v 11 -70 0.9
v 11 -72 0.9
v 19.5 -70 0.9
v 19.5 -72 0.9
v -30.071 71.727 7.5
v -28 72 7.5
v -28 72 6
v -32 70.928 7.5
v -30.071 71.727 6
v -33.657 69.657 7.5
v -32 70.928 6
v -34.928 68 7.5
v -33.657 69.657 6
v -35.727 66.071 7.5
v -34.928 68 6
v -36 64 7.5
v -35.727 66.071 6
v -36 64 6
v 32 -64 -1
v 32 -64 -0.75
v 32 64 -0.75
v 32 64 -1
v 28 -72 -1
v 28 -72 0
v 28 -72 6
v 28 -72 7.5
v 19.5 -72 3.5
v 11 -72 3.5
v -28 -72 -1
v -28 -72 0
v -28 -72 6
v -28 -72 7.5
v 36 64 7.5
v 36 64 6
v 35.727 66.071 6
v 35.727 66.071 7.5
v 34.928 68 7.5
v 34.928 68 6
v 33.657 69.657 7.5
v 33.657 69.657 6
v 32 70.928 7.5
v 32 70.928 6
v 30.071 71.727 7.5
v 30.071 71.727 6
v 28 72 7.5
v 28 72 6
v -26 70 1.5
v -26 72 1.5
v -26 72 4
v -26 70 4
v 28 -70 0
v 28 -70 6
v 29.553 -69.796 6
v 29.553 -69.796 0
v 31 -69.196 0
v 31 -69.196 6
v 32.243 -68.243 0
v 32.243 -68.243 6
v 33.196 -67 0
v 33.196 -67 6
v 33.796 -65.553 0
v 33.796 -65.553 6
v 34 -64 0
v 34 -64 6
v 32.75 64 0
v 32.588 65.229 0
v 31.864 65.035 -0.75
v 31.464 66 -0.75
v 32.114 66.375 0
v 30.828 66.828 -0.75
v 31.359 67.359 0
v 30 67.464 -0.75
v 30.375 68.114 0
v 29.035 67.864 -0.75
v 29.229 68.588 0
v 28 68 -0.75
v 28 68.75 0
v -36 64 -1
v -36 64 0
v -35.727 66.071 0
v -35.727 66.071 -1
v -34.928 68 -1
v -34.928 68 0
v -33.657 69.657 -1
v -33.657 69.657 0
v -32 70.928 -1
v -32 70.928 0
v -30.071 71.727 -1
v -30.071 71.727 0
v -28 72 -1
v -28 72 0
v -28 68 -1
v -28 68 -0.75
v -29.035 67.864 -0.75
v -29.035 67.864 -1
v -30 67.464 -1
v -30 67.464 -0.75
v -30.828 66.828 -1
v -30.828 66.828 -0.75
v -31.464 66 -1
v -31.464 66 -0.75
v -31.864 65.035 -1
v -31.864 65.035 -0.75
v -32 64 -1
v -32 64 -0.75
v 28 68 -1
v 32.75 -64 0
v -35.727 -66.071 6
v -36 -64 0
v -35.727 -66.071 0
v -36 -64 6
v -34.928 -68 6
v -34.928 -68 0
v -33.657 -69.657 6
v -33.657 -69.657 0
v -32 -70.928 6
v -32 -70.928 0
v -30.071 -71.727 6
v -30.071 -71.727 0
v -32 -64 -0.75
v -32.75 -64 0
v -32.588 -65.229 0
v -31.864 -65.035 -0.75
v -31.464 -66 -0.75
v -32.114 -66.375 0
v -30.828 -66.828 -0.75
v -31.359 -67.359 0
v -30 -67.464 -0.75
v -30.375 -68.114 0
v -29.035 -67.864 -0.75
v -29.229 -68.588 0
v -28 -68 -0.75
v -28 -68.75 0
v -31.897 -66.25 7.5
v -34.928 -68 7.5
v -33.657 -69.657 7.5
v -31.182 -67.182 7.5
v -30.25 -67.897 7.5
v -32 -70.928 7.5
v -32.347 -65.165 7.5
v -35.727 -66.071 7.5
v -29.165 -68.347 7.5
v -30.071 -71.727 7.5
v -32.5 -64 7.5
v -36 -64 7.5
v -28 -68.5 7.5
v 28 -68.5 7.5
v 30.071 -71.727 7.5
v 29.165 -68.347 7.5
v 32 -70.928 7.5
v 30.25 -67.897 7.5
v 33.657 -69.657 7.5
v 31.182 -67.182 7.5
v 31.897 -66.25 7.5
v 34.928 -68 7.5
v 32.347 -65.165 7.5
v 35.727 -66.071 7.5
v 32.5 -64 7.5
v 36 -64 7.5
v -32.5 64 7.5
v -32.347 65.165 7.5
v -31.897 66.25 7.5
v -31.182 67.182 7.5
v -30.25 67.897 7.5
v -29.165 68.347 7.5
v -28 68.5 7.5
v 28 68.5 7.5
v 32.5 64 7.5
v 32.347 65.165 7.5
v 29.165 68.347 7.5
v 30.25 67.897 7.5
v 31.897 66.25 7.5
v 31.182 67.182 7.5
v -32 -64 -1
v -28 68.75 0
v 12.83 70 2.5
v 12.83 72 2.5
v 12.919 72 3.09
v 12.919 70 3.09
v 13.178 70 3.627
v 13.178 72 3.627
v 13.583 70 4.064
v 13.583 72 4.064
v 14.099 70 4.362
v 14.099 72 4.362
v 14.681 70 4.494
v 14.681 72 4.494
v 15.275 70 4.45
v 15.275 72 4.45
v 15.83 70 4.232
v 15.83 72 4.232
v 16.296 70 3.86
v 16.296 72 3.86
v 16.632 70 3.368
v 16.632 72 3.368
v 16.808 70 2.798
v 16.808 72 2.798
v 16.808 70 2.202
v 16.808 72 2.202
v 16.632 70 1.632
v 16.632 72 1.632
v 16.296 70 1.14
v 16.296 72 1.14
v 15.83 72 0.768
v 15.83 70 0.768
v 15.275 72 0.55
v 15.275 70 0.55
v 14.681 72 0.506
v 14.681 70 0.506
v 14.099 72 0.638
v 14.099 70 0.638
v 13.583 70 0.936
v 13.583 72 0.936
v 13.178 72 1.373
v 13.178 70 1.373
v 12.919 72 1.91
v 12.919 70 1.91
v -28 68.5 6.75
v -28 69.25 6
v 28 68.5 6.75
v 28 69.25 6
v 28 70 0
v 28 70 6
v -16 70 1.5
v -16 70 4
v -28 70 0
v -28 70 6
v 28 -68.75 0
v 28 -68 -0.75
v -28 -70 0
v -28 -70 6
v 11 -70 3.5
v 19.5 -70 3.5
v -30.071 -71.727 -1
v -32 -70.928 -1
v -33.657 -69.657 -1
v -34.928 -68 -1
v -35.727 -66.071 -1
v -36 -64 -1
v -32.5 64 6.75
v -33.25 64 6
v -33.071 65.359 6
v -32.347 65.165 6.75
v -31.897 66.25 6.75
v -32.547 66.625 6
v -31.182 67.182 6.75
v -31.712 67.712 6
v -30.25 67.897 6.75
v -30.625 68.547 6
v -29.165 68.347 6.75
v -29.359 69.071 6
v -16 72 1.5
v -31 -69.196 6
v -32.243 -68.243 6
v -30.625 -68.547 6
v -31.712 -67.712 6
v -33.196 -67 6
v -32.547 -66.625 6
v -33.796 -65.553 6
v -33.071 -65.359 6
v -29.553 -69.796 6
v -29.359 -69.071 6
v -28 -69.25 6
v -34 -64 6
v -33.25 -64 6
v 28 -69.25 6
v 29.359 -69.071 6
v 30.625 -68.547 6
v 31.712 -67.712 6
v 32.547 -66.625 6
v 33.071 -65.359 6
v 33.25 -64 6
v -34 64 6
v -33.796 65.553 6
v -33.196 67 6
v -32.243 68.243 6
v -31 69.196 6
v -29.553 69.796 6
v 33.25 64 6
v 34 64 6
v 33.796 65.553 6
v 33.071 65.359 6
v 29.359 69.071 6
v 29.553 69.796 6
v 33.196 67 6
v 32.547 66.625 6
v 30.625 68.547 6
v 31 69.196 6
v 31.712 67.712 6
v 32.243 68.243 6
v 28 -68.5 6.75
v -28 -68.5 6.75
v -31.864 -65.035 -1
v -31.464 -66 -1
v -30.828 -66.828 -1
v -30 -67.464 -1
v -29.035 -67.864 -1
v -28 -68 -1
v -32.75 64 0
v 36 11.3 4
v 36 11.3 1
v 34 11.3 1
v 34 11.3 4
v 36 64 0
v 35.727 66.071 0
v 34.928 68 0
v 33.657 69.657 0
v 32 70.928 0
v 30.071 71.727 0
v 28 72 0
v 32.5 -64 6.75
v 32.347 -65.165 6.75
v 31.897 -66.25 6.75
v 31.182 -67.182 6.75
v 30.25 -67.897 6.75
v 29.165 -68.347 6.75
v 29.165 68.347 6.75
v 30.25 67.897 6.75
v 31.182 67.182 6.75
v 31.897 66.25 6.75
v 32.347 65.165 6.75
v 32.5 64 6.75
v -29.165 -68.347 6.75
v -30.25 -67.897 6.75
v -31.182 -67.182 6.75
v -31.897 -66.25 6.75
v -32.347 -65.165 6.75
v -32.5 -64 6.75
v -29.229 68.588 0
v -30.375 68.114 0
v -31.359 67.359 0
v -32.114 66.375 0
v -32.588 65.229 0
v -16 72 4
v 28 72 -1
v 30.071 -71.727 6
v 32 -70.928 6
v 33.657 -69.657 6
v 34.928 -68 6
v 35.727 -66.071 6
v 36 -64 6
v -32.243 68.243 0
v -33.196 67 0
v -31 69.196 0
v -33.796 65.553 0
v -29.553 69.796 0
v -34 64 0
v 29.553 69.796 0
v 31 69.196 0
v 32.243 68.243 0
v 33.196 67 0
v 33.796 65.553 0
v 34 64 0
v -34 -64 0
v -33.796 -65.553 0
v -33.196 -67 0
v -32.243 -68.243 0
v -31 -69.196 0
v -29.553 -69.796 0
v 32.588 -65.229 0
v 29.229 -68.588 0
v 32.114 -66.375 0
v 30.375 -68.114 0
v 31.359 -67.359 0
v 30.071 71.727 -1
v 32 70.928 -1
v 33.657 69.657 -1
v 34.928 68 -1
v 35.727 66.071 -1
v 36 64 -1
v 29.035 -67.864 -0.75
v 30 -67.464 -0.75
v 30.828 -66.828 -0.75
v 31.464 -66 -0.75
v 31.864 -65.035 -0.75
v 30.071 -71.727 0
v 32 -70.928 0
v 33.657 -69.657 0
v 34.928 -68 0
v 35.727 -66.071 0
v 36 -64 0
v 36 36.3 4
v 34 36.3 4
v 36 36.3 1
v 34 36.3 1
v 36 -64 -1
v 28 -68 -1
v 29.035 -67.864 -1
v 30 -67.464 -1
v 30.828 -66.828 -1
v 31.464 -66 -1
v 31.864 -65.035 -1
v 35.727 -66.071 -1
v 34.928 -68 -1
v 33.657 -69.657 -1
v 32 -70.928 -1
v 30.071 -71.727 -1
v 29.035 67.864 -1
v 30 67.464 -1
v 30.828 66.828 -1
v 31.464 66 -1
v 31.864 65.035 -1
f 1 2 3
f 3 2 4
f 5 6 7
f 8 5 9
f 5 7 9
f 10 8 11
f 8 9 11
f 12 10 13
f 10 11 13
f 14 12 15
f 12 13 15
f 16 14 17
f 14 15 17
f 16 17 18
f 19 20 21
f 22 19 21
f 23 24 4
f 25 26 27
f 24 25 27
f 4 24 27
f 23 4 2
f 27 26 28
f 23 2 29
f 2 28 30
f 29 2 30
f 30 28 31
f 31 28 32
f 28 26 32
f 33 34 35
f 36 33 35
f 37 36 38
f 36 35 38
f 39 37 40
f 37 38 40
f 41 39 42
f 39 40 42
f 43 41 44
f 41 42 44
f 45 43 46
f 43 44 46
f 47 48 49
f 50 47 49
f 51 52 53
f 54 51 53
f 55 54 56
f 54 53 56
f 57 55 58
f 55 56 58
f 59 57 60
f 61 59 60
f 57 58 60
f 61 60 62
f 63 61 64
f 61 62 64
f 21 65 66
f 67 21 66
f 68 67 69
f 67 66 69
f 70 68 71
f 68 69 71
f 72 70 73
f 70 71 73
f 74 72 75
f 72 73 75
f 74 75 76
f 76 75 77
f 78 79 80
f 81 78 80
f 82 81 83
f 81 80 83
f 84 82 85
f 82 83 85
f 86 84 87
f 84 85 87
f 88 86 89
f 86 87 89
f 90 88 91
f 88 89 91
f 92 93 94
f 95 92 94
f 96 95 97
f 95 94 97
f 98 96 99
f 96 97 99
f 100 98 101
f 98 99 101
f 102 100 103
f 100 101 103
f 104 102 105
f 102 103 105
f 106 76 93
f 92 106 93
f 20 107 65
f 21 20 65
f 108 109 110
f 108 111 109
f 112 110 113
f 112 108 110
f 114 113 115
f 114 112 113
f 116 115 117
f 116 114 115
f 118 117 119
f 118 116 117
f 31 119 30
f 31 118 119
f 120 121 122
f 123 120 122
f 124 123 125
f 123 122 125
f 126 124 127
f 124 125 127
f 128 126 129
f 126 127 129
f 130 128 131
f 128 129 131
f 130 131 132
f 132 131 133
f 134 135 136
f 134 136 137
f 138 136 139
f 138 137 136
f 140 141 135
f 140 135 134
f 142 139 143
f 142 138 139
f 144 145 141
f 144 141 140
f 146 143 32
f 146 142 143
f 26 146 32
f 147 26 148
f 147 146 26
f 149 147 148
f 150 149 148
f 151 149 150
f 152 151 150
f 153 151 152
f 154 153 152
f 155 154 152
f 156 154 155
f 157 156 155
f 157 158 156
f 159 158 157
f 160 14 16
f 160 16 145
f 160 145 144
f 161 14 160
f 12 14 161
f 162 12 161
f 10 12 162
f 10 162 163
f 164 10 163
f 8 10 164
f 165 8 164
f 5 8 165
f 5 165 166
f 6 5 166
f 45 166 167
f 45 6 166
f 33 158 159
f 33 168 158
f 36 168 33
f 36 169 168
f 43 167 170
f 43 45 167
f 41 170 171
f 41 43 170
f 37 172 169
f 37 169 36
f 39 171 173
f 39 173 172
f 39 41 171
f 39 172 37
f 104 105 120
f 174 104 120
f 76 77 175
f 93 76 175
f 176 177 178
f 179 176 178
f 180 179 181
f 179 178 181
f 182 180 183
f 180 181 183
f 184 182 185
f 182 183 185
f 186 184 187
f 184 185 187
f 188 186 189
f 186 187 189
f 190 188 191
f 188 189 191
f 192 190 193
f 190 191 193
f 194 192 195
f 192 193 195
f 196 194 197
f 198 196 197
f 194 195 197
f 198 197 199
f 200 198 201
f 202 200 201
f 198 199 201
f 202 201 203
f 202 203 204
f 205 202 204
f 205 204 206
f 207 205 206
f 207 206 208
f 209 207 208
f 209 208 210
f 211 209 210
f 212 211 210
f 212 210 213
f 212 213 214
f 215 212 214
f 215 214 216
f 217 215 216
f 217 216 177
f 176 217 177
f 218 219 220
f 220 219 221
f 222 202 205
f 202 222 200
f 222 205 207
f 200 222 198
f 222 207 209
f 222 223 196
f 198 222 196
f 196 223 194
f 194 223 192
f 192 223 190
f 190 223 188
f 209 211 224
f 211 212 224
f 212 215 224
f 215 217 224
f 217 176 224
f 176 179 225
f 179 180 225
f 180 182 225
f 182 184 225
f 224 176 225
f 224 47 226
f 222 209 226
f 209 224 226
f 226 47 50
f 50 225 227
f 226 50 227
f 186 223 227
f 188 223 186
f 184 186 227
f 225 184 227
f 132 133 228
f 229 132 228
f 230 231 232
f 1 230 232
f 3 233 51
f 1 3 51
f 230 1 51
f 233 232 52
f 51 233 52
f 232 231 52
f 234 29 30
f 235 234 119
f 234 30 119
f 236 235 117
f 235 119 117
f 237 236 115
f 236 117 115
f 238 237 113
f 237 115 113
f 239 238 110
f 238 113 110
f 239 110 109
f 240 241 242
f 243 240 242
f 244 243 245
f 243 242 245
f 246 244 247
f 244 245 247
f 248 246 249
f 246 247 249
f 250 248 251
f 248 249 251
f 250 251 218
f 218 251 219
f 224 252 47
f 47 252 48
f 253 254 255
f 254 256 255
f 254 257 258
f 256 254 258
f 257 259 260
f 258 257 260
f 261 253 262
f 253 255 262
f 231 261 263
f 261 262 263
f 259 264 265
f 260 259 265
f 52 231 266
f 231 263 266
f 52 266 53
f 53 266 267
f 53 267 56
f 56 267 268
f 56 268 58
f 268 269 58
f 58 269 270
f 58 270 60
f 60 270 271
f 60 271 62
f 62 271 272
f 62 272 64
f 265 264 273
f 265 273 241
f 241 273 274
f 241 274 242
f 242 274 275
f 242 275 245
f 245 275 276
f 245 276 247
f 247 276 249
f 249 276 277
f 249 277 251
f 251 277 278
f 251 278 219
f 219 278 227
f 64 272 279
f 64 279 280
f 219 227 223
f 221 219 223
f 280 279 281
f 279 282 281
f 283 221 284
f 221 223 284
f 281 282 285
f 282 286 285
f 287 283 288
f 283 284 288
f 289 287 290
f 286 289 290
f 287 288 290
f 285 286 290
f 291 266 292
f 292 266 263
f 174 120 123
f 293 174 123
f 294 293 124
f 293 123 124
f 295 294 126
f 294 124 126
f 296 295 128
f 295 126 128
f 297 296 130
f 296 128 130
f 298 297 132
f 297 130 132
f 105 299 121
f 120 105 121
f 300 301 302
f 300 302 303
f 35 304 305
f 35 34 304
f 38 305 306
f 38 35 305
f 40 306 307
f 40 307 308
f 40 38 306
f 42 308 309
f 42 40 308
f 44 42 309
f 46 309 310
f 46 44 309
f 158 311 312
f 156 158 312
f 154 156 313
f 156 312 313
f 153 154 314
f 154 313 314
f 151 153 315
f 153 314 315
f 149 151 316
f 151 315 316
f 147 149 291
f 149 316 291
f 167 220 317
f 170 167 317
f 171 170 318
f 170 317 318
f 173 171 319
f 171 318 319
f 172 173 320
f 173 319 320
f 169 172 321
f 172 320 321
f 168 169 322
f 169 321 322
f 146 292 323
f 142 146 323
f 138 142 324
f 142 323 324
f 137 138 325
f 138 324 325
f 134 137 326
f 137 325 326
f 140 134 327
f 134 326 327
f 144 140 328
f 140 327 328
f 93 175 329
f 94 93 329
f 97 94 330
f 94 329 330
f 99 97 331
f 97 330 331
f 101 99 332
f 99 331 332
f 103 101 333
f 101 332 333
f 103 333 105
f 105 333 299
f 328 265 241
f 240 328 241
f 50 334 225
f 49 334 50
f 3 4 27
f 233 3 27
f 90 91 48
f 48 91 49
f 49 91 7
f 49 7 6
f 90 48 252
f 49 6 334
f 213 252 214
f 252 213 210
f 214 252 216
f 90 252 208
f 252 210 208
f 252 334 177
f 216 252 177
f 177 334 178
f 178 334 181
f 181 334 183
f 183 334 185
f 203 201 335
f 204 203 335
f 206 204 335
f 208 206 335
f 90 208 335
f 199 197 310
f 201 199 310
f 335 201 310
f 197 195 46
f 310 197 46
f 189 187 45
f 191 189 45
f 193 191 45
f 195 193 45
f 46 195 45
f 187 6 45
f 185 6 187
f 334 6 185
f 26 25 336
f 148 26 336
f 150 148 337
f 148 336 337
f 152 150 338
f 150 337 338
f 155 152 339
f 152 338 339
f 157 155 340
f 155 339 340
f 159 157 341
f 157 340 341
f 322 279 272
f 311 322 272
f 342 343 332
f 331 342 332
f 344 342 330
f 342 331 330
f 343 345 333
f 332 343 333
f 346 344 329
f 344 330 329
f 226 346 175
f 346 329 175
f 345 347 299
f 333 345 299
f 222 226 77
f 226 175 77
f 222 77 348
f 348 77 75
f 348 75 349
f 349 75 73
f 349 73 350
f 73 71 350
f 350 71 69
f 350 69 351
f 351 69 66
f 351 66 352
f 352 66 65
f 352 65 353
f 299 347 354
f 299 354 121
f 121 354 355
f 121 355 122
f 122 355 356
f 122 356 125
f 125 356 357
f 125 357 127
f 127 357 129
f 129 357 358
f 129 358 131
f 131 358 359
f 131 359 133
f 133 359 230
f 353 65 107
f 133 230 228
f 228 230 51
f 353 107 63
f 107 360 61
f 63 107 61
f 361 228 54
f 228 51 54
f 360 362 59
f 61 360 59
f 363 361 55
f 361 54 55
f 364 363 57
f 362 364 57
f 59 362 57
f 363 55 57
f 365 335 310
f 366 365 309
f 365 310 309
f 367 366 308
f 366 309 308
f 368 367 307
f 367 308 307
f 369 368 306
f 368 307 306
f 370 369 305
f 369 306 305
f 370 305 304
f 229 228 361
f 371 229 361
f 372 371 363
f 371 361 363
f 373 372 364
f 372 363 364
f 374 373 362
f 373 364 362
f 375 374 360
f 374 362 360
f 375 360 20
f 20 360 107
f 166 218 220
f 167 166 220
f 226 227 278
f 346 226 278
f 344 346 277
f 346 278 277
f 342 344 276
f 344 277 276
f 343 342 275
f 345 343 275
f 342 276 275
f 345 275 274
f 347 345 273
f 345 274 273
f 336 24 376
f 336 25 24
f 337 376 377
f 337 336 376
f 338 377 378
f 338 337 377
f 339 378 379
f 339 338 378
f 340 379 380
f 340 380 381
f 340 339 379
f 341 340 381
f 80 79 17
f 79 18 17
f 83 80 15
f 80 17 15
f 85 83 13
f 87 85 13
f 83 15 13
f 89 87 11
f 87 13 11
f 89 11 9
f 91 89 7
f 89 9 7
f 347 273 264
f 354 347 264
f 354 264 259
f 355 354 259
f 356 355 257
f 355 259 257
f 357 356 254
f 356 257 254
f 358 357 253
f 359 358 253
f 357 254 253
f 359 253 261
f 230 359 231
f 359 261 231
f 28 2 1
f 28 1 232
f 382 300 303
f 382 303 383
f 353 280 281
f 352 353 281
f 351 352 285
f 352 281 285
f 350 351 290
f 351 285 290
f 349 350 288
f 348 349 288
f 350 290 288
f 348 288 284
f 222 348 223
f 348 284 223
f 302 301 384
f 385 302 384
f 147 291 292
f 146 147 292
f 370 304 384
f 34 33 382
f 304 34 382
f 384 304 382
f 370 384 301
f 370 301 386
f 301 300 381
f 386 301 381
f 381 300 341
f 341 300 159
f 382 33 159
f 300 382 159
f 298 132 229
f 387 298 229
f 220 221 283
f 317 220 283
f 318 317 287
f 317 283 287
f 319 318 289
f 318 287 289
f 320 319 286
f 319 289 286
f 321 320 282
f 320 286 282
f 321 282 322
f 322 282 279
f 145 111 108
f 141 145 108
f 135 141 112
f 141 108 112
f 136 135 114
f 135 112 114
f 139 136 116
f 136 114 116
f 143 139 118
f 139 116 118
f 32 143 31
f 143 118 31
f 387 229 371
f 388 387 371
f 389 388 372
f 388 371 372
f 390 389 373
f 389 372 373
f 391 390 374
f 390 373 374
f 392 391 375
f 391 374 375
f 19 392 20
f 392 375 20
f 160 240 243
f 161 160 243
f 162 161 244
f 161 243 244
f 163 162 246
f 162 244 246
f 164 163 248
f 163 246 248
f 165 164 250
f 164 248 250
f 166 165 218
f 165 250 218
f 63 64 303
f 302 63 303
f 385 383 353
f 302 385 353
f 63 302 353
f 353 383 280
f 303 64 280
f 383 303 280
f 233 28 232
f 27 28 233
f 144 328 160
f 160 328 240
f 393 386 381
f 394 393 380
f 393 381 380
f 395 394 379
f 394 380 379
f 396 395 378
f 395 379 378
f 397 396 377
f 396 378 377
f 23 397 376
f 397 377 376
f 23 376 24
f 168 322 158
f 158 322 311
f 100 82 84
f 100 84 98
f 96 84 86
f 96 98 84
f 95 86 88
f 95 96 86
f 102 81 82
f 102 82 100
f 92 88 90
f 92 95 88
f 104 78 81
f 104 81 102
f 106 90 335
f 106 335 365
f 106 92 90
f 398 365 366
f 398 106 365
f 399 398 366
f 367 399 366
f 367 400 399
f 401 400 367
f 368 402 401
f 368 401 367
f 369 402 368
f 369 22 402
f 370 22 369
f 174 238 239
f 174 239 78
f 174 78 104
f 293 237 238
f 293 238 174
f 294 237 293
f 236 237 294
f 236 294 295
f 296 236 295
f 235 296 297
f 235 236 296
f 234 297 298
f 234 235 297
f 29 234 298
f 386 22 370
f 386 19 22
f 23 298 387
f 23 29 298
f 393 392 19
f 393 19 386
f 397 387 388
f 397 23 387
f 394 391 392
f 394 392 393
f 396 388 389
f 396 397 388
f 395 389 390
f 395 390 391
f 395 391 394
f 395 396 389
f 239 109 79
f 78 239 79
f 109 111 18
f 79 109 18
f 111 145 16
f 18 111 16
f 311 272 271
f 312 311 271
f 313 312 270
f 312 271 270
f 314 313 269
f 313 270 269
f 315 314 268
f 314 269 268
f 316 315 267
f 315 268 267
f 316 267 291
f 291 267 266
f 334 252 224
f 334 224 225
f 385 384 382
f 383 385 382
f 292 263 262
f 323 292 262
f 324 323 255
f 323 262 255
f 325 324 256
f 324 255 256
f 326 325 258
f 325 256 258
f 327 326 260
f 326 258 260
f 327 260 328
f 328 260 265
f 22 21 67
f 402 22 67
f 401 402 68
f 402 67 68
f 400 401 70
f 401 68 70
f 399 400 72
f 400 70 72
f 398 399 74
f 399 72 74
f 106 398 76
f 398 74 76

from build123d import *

# Parameters (mm, degrees)
F0_W      = 72
F0_H      = 144
F1_DEPTH  = 6
F2_R      = 8
F3_R      = 5.8
F3_R_2    = 2
F4_DEPTH  = 25
F5_W      = 25
F5_H      = 3
F6_DEPTH  = 25
F7_W      = 8.5
F7_H      = 2.6
F8_DEPTH  = 25
F9_R      = 2
F9_W      = 10
F9_H      = 2.5
F10_DEPTH = 25
F12_DEPTH = 25
F14_DEPTH = 1.5
F16_DEPTH = 1
F17_SIZE  = 0.75


with BuildPart() as f1:
    # F0 (on Top) → F1 (new body)
    with BuildSketch(Plane.XY):
        Rectangle(F0_W, F0_H)
    extrude(amount=F1_DEPTH)

    # F2
    f2_edges = [f1.edges().sort_by_distance(p)[0] for p in [
        (-36, 72, 3),
        (36, 72, 3),
        (36, -72, 3),
        (-36, -72, 3),
    ]]
    fillet(f2_edges, radius=F2_R)

    # F3 (on Top) → F4 (cut)
    with BuildSketch(Plane.XY):
        with Locations((0, 47)):
            Circle(F3_R)
        with Locations((9.6, 47)):
            Circle(F3_R_2)
    extrude(amount=-F4_DEPTH, mode=Mode.SUBTRACT)

    # F5 (on face) → F6 (cut)
    with BuildSketch(Plane.YZ.offset(36)):
        with Locations((23.8, 2.5)):
            Rectangle(F5_W, F5_H)
    extrude(amount=-F6_DEPTH, mode=Mode.SUBTRACT)

    # F7 (on face) → F8 (cut)
    with BuildSketch(Plane.XZ.offset(72)):
        with Locations((15.25, 2.2)):
            Rectangle(F7_W, F7_H)
    extrude(amount=-F8_DEPTH, mode=Mode.SUBTRACT)

    # F9 (on face) → F10 (cut)
    with BuildSketch(Plane(origin=(0, 72, 0), x_dir=(-1, 0, 0), z_dir=(0, 1, 0))):
        with Locations((-14.83, 2.5)):
            Circle(F9_R)
        with Locations((21, 2.75)):
            Rectangle(F9_W, F9_H)
    extrude(amount=-F10_DEPTH, mode=Mode.SUBTRACT)

    # F11 (on face) → F12 (cut)
    with BuildSketch(Plane.XY.offset(6)):
        with BuildLine():
            Line((28, 70), (-28, 70))
            ThreePointArc((-28, 70), (-32.2426406871, 68.2426406871), (-34, 64))
            Line((-34, 64), (-34, -64))
            ThreePointArc((-34, -64), (-32.2426406871, -68.2426406871), (-28, -70))
            Line((-28, -70), (28, -70))
            ThreePointArc((28, -70), (32.2426406871, -68.2426406871), (34, -64))
            Line((34, -64), (34, 64))
            ThreePointArc((34, 64), (32.2426406871, 68.2426406871), (28, 70))
        make_face()
    extrude(amount=-F12_DEPTH, mode=Mode.SUBTRACT)

    # F13 (on face) → F14 (join)
    with BuildSketch(Plane.XY.offset(6)):
        with BuildLine():
            Line((28, 72), (-28, 72))
            ThreePointArc((-28, 72), (-33.6568542495, 69.6568542495), (-36, 64))
            Line((-36, 64), (-36, -64))
            ThreePointArc((-36, -64), (-33.6568542495, -69.6568542495), (-28, -72))
            Line((-28, -72), (28, -72))
            ThreePointArc((28, -72), (33.6568542495, -69.6568542495), (36, -64))
            Line((36, -64), (36, 64))
            ThreePointArc((36, 64), (33.6568542495, 69.6568542495), (28, 72))
        make_face()
        with BuildLine():
            ThreePointArc((-28, -68.5), (-31.1819805153, -67.1819805153), (-32.5, -64))
            Line((-32.5, -64), (-32.5, 64))
            ThreePointArc((-32.5, 64), (-31.1819805153, 67.1819805153), (-28, 68.5))
            Line((-28, 68.5), (28, 68.5))
            ThreePointArc((28, 68.5), (31.1819805153, 67.1819805153), (32.5, 64))
            Line((32.5, 64), (32.5, -64))
            ThreePointArc((32.5, -64), (31.1819805153, -67.1819805153), (28, -68.5))
            Line((28, -68.5), (-28, -68.5))
        make_face(mode=Mode.SUBTRACT)
    extrude(amount=F14_DEPTH)

    # F15 (on face) → F16 (join)
    with BuildSketch(Plane(origin=(0, 0, 0), x_dir=(1, 0, 0), z_dir=(0, 0, -1))):
        with BuildLine():
            Line((-28, -72), (28, -72))
            ThreePointArc((28, -72), (33.6568542495, -69.6568542495), (36, -64))
            Line((36, -64), (36, 64))
            ThreePointArc((36, 64), (33.6568542495, 69.6568542495), (28, 72))
            Line((28, 72), (-28, 72))
            ThreePointArc((-28, 72), (-33.6568542495, 69.6568542495), (-36, 64))
            Line((-36, 64), (-36, -64))
            ThreePointArc((-36, -64), (-33.6568542495, -69.6568542495), (-28, -72))
        make_face()
        with BuildLine():
            ThreePointArc((28, 70), (32.2426406871, 68.2426406871), (34, 64))
            Line((34, 64), (34, -64))
            ThreePointArc((34, -64), (32.2426406871, -68.2426406871), (28, -70))
            Line((28, -70), (-28, -70))
            ThreePointArc((-28, -70), (-32.2426406871, -68.2426406871), (-34, -64))
            Line((-34, -64), (-34, 64))
            ThreePointArc((-34, 64), (-32.2426406871, 68.2426406871), (-28, 70))
            Line((-28, 70), (28, 70))
        make_face(mode=Mode.SUBTRACT)
        with BuildLine():
            Line((34, -64), (34, 64))
            ThreePointArc((34, 64), (32.2426406871, 68.2426406871), (28, 70))
            Line((28, 70), (-28, 70))
            ThreePointArc((-28, 70), (-32.2426406871, 68.2426406871), (-34, 64))
            Line((-34, 64), (-34, -64))
            ThreePointArc((-34, -64), (-32.2426406871, -68.2426406871), (-28, -70))
            Line((-28, -70), (28, -70))
            ThreePointArc((28, -70), (32.2426406871, -68.2426406871), (34, -64))
        make_face()
        with BuildLine():
            ThreePointArc((-32, 64), (-30.8284271247, 66.8284271247), (-28, 68))
            Line((-28, 68), (28, 68))
            ThreePointArc((28, 68), (30.8284271247, 66.8284271247), (32, 64))
            Line((32, 64), (32, -64))
            ThreePointArc((32, -64), (30.8284271247, -66.8284271247), (28, -68))
            Line((28, -68), (-28, -68))
            ThreePointArc((-28, -68), (-30.8284271247, -66.8284271247), (-32, -64))
            Line((-32, -64), (-32, 64))
        make_face(mode=Mode.SUBTRACT)
    extrude(amount=F16_DEPTH)

    # F17
    f17_edges = [f1.edges().sort_by_distance(p)[0] for p in [
        (30.828427, -66.828427, 0),
        (31.181981, -67.181981, 6),
    ]]
    chamfer(f17_edges, length=F17_SIZE)


solid = f1.part
